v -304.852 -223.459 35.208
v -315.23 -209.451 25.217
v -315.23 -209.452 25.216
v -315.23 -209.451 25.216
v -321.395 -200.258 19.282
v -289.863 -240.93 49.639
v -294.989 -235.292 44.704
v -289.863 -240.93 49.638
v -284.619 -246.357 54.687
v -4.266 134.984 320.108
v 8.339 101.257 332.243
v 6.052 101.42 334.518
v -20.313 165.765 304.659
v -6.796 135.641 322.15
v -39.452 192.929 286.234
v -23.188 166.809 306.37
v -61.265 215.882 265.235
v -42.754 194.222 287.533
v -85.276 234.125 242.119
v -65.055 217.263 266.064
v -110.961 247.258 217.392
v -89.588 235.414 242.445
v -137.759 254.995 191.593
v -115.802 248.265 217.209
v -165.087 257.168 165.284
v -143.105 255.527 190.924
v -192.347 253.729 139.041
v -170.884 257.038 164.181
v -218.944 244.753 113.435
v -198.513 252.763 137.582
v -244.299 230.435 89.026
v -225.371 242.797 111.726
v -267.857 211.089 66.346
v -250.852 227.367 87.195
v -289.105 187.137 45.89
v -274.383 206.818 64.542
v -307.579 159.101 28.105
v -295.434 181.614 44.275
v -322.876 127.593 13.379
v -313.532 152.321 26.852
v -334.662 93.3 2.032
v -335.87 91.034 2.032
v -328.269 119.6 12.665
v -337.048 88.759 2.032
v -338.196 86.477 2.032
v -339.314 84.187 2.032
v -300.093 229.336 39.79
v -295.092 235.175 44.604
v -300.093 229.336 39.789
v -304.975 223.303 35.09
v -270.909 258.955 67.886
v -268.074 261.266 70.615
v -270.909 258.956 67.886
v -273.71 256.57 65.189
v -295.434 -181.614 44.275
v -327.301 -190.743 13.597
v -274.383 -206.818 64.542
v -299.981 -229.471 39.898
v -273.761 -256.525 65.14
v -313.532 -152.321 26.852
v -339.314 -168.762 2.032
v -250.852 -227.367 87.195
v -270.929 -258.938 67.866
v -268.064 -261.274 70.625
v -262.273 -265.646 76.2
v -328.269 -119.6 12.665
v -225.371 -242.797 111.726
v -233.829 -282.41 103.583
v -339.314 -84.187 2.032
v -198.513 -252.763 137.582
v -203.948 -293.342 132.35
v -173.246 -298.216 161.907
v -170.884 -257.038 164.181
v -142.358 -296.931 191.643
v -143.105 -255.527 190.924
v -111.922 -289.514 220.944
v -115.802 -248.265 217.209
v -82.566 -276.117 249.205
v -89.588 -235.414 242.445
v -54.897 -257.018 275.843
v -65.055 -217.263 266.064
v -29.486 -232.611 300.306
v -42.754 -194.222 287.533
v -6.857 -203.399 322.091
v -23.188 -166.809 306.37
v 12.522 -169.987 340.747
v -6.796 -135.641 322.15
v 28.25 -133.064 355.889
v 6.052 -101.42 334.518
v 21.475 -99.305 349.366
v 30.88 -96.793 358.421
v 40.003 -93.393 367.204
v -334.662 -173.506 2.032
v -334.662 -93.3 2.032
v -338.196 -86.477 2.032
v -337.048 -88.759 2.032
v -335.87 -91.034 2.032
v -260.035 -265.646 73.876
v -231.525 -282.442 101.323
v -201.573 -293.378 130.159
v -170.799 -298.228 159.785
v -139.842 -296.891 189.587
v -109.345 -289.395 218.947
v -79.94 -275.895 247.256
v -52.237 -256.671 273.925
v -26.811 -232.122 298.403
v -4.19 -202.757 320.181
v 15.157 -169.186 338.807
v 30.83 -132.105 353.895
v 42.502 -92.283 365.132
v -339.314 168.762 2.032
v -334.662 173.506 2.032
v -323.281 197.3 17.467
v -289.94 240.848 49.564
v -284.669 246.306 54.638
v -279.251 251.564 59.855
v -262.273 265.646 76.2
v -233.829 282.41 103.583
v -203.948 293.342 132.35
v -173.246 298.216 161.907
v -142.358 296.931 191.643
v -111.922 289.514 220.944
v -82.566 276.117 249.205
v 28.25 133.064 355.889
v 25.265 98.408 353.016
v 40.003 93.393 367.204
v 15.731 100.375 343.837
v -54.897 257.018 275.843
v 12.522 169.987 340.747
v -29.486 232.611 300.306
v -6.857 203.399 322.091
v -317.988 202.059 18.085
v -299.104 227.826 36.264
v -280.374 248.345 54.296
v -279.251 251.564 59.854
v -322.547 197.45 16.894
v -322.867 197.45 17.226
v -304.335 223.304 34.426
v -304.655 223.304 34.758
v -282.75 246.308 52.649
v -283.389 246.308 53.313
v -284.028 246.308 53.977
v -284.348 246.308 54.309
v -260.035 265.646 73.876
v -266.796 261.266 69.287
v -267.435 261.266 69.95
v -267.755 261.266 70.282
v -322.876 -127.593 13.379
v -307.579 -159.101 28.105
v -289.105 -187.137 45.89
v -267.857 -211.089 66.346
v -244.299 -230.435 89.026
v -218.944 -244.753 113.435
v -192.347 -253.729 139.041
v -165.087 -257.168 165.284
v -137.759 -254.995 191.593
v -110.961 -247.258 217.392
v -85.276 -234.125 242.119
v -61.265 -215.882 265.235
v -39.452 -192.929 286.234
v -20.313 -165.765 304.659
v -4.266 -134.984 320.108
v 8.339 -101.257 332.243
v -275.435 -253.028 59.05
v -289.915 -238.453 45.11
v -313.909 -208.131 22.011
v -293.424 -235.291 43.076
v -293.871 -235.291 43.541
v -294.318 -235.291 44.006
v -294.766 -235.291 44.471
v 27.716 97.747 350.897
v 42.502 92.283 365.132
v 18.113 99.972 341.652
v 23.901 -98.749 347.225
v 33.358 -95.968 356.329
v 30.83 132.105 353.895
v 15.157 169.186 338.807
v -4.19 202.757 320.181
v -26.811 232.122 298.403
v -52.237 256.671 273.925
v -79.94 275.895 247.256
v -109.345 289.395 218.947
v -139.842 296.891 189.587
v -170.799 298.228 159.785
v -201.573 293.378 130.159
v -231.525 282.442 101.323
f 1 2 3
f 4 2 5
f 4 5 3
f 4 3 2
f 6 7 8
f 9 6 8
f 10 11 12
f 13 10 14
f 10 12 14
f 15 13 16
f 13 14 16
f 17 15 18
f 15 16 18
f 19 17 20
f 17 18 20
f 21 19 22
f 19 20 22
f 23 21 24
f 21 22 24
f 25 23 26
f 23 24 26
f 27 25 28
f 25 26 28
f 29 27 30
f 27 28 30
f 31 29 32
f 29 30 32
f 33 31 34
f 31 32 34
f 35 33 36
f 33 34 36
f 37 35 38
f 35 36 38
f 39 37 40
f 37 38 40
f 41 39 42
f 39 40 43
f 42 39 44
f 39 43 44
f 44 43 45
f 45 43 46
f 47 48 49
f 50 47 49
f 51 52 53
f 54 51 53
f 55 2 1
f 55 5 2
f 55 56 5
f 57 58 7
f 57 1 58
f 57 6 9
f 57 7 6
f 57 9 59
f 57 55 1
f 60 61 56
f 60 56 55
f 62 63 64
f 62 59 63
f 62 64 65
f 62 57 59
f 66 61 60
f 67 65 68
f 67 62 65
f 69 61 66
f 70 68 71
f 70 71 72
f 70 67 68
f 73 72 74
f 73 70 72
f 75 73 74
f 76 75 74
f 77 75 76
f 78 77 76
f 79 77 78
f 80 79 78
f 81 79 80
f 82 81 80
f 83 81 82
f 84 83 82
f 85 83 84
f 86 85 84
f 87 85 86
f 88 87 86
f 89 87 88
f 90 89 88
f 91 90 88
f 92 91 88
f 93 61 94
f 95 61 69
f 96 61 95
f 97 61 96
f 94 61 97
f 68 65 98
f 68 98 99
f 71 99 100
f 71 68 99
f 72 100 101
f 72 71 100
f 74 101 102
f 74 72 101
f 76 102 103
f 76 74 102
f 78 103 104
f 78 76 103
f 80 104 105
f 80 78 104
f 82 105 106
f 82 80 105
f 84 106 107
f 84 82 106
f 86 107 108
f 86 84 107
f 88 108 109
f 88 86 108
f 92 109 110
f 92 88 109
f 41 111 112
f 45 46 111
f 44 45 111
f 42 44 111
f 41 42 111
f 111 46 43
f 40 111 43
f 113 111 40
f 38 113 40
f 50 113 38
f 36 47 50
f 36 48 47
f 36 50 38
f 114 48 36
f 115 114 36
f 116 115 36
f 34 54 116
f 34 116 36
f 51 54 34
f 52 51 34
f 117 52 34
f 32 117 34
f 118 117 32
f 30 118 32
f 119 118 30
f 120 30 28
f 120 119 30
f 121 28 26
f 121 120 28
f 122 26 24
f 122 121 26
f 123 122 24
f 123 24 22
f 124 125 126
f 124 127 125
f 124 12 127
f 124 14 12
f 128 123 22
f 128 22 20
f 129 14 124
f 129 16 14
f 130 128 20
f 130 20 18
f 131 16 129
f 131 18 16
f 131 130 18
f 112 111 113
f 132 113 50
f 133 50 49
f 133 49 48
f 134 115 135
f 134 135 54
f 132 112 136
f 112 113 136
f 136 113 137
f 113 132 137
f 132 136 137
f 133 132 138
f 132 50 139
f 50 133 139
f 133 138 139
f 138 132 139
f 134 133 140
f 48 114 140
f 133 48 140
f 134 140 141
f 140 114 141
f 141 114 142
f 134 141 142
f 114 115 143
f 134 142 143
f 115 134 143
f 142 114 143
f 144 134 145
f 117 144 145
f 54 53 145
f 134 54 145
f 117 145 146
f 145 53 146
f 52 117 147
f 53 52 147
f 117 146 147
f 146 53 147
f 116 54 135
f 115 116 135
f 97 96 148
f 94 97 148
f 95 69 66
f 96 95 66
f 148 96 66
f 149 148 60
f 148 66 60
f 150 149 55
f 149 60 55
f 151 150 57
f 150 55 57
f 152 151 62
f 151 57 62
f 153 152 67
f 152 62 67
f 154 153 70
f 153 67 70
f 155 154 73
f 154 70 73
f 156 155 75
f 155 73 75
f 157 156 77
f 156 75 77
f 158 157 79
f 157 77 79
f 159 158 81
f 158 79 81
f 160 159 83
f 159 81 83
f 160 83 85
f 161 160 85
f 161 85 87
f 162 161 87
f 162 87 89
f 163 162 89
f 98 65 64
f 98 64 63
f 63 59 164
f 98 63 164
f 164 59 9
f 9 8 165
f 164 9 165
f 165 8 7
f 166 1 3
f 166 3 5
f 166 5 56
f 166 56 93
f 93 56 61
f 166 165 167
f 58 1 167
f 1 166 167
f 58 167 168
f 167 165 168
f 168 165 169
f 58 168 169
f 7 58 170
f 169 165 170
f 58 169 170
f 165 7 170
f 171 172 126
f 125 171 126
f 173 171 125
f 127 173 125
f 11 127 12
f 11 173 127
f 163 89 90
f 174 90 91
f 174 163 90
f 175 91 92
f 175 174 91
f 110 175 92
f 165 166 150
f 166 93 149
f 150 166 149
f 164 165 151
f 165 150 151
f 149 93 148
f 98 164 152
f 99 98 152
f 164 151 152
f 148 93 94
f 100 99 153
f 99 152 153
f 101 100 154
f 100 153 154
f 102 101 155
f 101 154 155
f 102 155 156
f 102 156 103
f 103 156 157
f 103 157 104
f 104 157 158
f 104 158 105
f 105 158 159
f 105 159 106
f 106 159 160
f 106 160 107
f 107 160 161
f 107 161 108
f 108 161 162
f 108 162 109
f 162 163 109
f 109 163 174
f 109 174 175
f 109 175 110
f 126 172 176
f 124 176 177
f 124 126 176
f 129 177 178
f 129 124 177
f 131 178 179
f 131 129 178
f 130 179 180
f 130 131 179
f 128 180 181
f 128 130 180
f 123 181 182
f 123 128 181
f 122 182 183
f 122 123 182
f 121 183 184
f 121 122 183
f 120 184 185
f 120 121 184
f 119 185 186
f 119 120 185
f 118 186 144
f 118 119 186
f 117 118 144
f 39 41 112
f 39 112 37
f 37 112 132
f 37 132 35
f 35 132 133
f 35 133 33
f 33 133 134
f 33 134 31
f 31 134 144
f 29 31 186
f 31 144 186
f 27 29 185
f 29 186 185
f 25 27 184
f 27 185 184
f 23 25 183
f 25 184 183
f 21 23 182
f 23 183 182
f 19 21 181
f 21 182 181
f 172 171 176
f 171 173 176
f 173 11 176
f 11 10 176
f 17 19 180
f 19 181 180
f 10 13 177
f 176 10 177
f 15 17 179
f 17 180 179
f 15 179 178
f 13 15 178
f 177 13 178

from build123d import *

# Parameters (mm, degrees)
SKETCH2_R               = 298.47899177
SKETCH2_R_2             = 257.20399177
EXTRUDE1_DEPTH          = 3.2258
SKETCH3_R               = 101.6
CUT_EXTRUDE1_DEPTH      = 613.784324244
SKETCH4_R               = 381
CUT_EXTRUDE2_DEPTH      = 2.032
CUT_EXTRUDE2_DEPTH_BACK = 607.43442205
CUT_EXTRUDE3_DEPTH      = 413.89718972


with BuildPart() as part:
    # Sketch2 → Extrude1 (new body)
    with BuildSketch(Plane(origin=(-164.227634794, 0, 170.588907734), x_dir=(0.7204112876391361, 0, 0.6935470976380206), z_dir=(-0.6935470976380206, 0, 0.7204112876391361))):
        Circle(SKETCH2_R)
        Circle(SKETCH2_R_2, mode=Mode.SUBTRACT)
    extrude(amount=-EXTRUDE1_DEPTH)

    # Sketch3 → Cut-Extrude1 (cut, through all)
    with BuildSketch(Plane.XY):
        Circle(SKETCH3_R)
    extrude(amount=CUT_EXTRUDE1_DEPTH, mode=Mode.SUBTRACT)

    # Sketch4 → Cut-Extrude2 (cut, two sides)
    with BuildSketch(Plane.XY) as cut_extrude2_sk:
        Circle(SKETCH4_R)
    extrude(amount=CUT_EXTRUDE2_DEPTH, mode=Mode.SUBTRACT)
    extrude(cut_extrude2_sk.sketch, amount=-CUT_EXTRUDE2_DEPTH_BACK, mode=Mode.SUBTRACT)


with BuildPart() as cut_extrude2_piece_1:
    # of the separate pieces the step leaves, piece 1, a body of its own (cut_extrude2_pieces)
    add(part.part.solids().sort_by_distance((-339.313507628, -173.272082337, 2.032))[0])


with BuildPart() as cut_extrude2_piece_2:
    # of the separate pieces the step leaves, piece 2, a body of its own (cut_extrude2_pieces)
    add(part.part.solids().sort_by_distance((-334.662345492, 177.878308285, 2.032))[0])


with BuildPart() as cut_revolve5_tool:
    # Sketch5 → Cut-Revolve5 (revolve)
    with BuildSketch(Plane(origin=(0, 0, 0), x_dir=(1, 0, 0), z_dir=(0, 1, 0))):
        with BuildLine():
            Line((-373.3022368, -76.2), (-525.7022368, -76.2))
            Line((-525.7022368, -76.2), (-525.7022368, 76.2))
            Line((-525.7022368, 76.2), (-373.3022368, 76.2))
            add(Edge.make_bspline(
                [(-373.3022368, 76.2), (-388.856496667, 0), (-373.3022368, -76.2)],
                knots=[3.751711748, 3.751711748, 3.751711748, 5.673066213, 5.673066213, 5.673066213], degree=2, weights=[1, 0.572965072, 1]))
        make_face()
    revolve(axis=Axis((0, 0, 0), (0, 0, 1)))


with BuildPart() as cut_extrude2_piece_1_1:
    add(cut_extrude2_piece_1.part)

    # Cut-Revolve5: cut by cut_revolve5_tool
    add(cut_revolve5_tool.part, mode=Mode.SUBTRACT)


with BuildPart() as cut_extrude2_piece_2_1:
    add(cut_extrude2_piece_2.part)

    # Cut-Revolve5: cut by cut_revolve5_tool
    add(cut_revolve5_tool.part, mode=Mode.SUBTRACT)


with BuildPart() as cut_extrude3_tool:
    # Sketch6 → Cut-Extrude3 (new, through all)
    with BuildSketch(Plane(origin=(-164.227634794, 0, 170.588907734), x_dir=(0.720411287639136, 0, 0.6935470976380206), z_dir=(-0.6935470976380206, 0, 0.720411287639136))):
        with BuildLine():
            Line((-243.035993241, 168.7622191), (-243.035993241, 265.645662397))
            Line((-243.035993241, 265.645662397), (-136.095887439, 265.645662397))
            add(Edge.make_bspline(
                [(-243.035993241, 168.7622191), (-236.073192799, 178.81372708), (-228.600124987, 188.365480079), (-212.699682128, 206.534339224), (-204.272986727, 215.152111012), (-190.918840798, 227.37937762), (-186.347935418, 231.338072142), (-176.957107882, 239.011574584), (-172.137535558, 242.72672513), (-162.22593818, 249.89018649), (-157.168166325, 253.315093679), (-149.411750774, 258.173655162), (-146.797416665, 259.746699718), (-141.501528842, 262.784547331), (-138.820306945, 264.249884702), (-136.095887439, 265.645662397)],
                knots=[0, 0, 0, 0, 0.25, 0.25, 0.5, 0.5, 0.625, 0.625, 0.75, 0.75, 0.875, 0.875, 0.9375, 0.9375, 1, 1, 1, 1], degree=3))
        make_face()
        with BuildLine():
            Line((-243.035993241, -168.7622191), (-243.035993241, -265.645662397))
            Line((-243.035993241, -265.645662397), (-136.095887439, -265.645662397))
            add(Edge.make_bspline(
                [(-136.095887439, -265.645662397), (-138.81358705, -264.253327446), (-141.490093076, -262.790832153), (-146.779385996, -259.757316018), (-149.391862349, -258.185766269), (-154.561405307, -254.948293654), (-157.121073222, -253.280304755), (-162.170048063, -249.871314446), (-164.660725074, -248.129506053), (-172.038584185, -242.80015254), (-176.832048478, -239.109180253), (-186.188456762, -231.472832985), (-190.751100547, -227.527126699), (-204.102969746, -215.319128934), (-212.558128719, -206.688161028), (-222.558047173, -195.271468149), (-224.52939951, -192.956531952), (-228.413886115, -188.262409971), (-230.325108237, -185.885421736), (-235.951043458, -178.681435362), (-239.563736335, -173.774773789), (-243.035993241, -168.7622191)],
                knots=[0, 0, 0, 0, 0.0625, 0.0625, 0.125, 0.125, 0.1875, 0.1875, 0.25, 0.25, 0.375, 0.375, 0.5, 0.5, 0.75, 0.75, 0.8125, 0.8125, 0.875, 0.875, 1, 1, 1, 1], degree=3))
        make_face()
    extrude(amount=-CUT_EXTRUDE3_DEPTH)


with BuildPart() as cut_extrude2_piece_1_2:
    add(cut_extrude2_piece_1_1.part)

    # Cut-Extrude3: cut by cut_extrude3_tool
    add(cut_extrude3_tool.part, mode=Mode.SUBTRACT)


with BuildPart() as cut_extrude2_piece_2_2:
    add(cut_extrude2_piece_2_1.part)

    # Cut-Extrude3: cut by cut_extrude3_tool
    add(cut_extrude3_tool.part, mode=Mode.SUBTRACT)


solid = Compound([cut_extrude2_piece_1_2.part, cut_extrude2_piece_2_2.part])
